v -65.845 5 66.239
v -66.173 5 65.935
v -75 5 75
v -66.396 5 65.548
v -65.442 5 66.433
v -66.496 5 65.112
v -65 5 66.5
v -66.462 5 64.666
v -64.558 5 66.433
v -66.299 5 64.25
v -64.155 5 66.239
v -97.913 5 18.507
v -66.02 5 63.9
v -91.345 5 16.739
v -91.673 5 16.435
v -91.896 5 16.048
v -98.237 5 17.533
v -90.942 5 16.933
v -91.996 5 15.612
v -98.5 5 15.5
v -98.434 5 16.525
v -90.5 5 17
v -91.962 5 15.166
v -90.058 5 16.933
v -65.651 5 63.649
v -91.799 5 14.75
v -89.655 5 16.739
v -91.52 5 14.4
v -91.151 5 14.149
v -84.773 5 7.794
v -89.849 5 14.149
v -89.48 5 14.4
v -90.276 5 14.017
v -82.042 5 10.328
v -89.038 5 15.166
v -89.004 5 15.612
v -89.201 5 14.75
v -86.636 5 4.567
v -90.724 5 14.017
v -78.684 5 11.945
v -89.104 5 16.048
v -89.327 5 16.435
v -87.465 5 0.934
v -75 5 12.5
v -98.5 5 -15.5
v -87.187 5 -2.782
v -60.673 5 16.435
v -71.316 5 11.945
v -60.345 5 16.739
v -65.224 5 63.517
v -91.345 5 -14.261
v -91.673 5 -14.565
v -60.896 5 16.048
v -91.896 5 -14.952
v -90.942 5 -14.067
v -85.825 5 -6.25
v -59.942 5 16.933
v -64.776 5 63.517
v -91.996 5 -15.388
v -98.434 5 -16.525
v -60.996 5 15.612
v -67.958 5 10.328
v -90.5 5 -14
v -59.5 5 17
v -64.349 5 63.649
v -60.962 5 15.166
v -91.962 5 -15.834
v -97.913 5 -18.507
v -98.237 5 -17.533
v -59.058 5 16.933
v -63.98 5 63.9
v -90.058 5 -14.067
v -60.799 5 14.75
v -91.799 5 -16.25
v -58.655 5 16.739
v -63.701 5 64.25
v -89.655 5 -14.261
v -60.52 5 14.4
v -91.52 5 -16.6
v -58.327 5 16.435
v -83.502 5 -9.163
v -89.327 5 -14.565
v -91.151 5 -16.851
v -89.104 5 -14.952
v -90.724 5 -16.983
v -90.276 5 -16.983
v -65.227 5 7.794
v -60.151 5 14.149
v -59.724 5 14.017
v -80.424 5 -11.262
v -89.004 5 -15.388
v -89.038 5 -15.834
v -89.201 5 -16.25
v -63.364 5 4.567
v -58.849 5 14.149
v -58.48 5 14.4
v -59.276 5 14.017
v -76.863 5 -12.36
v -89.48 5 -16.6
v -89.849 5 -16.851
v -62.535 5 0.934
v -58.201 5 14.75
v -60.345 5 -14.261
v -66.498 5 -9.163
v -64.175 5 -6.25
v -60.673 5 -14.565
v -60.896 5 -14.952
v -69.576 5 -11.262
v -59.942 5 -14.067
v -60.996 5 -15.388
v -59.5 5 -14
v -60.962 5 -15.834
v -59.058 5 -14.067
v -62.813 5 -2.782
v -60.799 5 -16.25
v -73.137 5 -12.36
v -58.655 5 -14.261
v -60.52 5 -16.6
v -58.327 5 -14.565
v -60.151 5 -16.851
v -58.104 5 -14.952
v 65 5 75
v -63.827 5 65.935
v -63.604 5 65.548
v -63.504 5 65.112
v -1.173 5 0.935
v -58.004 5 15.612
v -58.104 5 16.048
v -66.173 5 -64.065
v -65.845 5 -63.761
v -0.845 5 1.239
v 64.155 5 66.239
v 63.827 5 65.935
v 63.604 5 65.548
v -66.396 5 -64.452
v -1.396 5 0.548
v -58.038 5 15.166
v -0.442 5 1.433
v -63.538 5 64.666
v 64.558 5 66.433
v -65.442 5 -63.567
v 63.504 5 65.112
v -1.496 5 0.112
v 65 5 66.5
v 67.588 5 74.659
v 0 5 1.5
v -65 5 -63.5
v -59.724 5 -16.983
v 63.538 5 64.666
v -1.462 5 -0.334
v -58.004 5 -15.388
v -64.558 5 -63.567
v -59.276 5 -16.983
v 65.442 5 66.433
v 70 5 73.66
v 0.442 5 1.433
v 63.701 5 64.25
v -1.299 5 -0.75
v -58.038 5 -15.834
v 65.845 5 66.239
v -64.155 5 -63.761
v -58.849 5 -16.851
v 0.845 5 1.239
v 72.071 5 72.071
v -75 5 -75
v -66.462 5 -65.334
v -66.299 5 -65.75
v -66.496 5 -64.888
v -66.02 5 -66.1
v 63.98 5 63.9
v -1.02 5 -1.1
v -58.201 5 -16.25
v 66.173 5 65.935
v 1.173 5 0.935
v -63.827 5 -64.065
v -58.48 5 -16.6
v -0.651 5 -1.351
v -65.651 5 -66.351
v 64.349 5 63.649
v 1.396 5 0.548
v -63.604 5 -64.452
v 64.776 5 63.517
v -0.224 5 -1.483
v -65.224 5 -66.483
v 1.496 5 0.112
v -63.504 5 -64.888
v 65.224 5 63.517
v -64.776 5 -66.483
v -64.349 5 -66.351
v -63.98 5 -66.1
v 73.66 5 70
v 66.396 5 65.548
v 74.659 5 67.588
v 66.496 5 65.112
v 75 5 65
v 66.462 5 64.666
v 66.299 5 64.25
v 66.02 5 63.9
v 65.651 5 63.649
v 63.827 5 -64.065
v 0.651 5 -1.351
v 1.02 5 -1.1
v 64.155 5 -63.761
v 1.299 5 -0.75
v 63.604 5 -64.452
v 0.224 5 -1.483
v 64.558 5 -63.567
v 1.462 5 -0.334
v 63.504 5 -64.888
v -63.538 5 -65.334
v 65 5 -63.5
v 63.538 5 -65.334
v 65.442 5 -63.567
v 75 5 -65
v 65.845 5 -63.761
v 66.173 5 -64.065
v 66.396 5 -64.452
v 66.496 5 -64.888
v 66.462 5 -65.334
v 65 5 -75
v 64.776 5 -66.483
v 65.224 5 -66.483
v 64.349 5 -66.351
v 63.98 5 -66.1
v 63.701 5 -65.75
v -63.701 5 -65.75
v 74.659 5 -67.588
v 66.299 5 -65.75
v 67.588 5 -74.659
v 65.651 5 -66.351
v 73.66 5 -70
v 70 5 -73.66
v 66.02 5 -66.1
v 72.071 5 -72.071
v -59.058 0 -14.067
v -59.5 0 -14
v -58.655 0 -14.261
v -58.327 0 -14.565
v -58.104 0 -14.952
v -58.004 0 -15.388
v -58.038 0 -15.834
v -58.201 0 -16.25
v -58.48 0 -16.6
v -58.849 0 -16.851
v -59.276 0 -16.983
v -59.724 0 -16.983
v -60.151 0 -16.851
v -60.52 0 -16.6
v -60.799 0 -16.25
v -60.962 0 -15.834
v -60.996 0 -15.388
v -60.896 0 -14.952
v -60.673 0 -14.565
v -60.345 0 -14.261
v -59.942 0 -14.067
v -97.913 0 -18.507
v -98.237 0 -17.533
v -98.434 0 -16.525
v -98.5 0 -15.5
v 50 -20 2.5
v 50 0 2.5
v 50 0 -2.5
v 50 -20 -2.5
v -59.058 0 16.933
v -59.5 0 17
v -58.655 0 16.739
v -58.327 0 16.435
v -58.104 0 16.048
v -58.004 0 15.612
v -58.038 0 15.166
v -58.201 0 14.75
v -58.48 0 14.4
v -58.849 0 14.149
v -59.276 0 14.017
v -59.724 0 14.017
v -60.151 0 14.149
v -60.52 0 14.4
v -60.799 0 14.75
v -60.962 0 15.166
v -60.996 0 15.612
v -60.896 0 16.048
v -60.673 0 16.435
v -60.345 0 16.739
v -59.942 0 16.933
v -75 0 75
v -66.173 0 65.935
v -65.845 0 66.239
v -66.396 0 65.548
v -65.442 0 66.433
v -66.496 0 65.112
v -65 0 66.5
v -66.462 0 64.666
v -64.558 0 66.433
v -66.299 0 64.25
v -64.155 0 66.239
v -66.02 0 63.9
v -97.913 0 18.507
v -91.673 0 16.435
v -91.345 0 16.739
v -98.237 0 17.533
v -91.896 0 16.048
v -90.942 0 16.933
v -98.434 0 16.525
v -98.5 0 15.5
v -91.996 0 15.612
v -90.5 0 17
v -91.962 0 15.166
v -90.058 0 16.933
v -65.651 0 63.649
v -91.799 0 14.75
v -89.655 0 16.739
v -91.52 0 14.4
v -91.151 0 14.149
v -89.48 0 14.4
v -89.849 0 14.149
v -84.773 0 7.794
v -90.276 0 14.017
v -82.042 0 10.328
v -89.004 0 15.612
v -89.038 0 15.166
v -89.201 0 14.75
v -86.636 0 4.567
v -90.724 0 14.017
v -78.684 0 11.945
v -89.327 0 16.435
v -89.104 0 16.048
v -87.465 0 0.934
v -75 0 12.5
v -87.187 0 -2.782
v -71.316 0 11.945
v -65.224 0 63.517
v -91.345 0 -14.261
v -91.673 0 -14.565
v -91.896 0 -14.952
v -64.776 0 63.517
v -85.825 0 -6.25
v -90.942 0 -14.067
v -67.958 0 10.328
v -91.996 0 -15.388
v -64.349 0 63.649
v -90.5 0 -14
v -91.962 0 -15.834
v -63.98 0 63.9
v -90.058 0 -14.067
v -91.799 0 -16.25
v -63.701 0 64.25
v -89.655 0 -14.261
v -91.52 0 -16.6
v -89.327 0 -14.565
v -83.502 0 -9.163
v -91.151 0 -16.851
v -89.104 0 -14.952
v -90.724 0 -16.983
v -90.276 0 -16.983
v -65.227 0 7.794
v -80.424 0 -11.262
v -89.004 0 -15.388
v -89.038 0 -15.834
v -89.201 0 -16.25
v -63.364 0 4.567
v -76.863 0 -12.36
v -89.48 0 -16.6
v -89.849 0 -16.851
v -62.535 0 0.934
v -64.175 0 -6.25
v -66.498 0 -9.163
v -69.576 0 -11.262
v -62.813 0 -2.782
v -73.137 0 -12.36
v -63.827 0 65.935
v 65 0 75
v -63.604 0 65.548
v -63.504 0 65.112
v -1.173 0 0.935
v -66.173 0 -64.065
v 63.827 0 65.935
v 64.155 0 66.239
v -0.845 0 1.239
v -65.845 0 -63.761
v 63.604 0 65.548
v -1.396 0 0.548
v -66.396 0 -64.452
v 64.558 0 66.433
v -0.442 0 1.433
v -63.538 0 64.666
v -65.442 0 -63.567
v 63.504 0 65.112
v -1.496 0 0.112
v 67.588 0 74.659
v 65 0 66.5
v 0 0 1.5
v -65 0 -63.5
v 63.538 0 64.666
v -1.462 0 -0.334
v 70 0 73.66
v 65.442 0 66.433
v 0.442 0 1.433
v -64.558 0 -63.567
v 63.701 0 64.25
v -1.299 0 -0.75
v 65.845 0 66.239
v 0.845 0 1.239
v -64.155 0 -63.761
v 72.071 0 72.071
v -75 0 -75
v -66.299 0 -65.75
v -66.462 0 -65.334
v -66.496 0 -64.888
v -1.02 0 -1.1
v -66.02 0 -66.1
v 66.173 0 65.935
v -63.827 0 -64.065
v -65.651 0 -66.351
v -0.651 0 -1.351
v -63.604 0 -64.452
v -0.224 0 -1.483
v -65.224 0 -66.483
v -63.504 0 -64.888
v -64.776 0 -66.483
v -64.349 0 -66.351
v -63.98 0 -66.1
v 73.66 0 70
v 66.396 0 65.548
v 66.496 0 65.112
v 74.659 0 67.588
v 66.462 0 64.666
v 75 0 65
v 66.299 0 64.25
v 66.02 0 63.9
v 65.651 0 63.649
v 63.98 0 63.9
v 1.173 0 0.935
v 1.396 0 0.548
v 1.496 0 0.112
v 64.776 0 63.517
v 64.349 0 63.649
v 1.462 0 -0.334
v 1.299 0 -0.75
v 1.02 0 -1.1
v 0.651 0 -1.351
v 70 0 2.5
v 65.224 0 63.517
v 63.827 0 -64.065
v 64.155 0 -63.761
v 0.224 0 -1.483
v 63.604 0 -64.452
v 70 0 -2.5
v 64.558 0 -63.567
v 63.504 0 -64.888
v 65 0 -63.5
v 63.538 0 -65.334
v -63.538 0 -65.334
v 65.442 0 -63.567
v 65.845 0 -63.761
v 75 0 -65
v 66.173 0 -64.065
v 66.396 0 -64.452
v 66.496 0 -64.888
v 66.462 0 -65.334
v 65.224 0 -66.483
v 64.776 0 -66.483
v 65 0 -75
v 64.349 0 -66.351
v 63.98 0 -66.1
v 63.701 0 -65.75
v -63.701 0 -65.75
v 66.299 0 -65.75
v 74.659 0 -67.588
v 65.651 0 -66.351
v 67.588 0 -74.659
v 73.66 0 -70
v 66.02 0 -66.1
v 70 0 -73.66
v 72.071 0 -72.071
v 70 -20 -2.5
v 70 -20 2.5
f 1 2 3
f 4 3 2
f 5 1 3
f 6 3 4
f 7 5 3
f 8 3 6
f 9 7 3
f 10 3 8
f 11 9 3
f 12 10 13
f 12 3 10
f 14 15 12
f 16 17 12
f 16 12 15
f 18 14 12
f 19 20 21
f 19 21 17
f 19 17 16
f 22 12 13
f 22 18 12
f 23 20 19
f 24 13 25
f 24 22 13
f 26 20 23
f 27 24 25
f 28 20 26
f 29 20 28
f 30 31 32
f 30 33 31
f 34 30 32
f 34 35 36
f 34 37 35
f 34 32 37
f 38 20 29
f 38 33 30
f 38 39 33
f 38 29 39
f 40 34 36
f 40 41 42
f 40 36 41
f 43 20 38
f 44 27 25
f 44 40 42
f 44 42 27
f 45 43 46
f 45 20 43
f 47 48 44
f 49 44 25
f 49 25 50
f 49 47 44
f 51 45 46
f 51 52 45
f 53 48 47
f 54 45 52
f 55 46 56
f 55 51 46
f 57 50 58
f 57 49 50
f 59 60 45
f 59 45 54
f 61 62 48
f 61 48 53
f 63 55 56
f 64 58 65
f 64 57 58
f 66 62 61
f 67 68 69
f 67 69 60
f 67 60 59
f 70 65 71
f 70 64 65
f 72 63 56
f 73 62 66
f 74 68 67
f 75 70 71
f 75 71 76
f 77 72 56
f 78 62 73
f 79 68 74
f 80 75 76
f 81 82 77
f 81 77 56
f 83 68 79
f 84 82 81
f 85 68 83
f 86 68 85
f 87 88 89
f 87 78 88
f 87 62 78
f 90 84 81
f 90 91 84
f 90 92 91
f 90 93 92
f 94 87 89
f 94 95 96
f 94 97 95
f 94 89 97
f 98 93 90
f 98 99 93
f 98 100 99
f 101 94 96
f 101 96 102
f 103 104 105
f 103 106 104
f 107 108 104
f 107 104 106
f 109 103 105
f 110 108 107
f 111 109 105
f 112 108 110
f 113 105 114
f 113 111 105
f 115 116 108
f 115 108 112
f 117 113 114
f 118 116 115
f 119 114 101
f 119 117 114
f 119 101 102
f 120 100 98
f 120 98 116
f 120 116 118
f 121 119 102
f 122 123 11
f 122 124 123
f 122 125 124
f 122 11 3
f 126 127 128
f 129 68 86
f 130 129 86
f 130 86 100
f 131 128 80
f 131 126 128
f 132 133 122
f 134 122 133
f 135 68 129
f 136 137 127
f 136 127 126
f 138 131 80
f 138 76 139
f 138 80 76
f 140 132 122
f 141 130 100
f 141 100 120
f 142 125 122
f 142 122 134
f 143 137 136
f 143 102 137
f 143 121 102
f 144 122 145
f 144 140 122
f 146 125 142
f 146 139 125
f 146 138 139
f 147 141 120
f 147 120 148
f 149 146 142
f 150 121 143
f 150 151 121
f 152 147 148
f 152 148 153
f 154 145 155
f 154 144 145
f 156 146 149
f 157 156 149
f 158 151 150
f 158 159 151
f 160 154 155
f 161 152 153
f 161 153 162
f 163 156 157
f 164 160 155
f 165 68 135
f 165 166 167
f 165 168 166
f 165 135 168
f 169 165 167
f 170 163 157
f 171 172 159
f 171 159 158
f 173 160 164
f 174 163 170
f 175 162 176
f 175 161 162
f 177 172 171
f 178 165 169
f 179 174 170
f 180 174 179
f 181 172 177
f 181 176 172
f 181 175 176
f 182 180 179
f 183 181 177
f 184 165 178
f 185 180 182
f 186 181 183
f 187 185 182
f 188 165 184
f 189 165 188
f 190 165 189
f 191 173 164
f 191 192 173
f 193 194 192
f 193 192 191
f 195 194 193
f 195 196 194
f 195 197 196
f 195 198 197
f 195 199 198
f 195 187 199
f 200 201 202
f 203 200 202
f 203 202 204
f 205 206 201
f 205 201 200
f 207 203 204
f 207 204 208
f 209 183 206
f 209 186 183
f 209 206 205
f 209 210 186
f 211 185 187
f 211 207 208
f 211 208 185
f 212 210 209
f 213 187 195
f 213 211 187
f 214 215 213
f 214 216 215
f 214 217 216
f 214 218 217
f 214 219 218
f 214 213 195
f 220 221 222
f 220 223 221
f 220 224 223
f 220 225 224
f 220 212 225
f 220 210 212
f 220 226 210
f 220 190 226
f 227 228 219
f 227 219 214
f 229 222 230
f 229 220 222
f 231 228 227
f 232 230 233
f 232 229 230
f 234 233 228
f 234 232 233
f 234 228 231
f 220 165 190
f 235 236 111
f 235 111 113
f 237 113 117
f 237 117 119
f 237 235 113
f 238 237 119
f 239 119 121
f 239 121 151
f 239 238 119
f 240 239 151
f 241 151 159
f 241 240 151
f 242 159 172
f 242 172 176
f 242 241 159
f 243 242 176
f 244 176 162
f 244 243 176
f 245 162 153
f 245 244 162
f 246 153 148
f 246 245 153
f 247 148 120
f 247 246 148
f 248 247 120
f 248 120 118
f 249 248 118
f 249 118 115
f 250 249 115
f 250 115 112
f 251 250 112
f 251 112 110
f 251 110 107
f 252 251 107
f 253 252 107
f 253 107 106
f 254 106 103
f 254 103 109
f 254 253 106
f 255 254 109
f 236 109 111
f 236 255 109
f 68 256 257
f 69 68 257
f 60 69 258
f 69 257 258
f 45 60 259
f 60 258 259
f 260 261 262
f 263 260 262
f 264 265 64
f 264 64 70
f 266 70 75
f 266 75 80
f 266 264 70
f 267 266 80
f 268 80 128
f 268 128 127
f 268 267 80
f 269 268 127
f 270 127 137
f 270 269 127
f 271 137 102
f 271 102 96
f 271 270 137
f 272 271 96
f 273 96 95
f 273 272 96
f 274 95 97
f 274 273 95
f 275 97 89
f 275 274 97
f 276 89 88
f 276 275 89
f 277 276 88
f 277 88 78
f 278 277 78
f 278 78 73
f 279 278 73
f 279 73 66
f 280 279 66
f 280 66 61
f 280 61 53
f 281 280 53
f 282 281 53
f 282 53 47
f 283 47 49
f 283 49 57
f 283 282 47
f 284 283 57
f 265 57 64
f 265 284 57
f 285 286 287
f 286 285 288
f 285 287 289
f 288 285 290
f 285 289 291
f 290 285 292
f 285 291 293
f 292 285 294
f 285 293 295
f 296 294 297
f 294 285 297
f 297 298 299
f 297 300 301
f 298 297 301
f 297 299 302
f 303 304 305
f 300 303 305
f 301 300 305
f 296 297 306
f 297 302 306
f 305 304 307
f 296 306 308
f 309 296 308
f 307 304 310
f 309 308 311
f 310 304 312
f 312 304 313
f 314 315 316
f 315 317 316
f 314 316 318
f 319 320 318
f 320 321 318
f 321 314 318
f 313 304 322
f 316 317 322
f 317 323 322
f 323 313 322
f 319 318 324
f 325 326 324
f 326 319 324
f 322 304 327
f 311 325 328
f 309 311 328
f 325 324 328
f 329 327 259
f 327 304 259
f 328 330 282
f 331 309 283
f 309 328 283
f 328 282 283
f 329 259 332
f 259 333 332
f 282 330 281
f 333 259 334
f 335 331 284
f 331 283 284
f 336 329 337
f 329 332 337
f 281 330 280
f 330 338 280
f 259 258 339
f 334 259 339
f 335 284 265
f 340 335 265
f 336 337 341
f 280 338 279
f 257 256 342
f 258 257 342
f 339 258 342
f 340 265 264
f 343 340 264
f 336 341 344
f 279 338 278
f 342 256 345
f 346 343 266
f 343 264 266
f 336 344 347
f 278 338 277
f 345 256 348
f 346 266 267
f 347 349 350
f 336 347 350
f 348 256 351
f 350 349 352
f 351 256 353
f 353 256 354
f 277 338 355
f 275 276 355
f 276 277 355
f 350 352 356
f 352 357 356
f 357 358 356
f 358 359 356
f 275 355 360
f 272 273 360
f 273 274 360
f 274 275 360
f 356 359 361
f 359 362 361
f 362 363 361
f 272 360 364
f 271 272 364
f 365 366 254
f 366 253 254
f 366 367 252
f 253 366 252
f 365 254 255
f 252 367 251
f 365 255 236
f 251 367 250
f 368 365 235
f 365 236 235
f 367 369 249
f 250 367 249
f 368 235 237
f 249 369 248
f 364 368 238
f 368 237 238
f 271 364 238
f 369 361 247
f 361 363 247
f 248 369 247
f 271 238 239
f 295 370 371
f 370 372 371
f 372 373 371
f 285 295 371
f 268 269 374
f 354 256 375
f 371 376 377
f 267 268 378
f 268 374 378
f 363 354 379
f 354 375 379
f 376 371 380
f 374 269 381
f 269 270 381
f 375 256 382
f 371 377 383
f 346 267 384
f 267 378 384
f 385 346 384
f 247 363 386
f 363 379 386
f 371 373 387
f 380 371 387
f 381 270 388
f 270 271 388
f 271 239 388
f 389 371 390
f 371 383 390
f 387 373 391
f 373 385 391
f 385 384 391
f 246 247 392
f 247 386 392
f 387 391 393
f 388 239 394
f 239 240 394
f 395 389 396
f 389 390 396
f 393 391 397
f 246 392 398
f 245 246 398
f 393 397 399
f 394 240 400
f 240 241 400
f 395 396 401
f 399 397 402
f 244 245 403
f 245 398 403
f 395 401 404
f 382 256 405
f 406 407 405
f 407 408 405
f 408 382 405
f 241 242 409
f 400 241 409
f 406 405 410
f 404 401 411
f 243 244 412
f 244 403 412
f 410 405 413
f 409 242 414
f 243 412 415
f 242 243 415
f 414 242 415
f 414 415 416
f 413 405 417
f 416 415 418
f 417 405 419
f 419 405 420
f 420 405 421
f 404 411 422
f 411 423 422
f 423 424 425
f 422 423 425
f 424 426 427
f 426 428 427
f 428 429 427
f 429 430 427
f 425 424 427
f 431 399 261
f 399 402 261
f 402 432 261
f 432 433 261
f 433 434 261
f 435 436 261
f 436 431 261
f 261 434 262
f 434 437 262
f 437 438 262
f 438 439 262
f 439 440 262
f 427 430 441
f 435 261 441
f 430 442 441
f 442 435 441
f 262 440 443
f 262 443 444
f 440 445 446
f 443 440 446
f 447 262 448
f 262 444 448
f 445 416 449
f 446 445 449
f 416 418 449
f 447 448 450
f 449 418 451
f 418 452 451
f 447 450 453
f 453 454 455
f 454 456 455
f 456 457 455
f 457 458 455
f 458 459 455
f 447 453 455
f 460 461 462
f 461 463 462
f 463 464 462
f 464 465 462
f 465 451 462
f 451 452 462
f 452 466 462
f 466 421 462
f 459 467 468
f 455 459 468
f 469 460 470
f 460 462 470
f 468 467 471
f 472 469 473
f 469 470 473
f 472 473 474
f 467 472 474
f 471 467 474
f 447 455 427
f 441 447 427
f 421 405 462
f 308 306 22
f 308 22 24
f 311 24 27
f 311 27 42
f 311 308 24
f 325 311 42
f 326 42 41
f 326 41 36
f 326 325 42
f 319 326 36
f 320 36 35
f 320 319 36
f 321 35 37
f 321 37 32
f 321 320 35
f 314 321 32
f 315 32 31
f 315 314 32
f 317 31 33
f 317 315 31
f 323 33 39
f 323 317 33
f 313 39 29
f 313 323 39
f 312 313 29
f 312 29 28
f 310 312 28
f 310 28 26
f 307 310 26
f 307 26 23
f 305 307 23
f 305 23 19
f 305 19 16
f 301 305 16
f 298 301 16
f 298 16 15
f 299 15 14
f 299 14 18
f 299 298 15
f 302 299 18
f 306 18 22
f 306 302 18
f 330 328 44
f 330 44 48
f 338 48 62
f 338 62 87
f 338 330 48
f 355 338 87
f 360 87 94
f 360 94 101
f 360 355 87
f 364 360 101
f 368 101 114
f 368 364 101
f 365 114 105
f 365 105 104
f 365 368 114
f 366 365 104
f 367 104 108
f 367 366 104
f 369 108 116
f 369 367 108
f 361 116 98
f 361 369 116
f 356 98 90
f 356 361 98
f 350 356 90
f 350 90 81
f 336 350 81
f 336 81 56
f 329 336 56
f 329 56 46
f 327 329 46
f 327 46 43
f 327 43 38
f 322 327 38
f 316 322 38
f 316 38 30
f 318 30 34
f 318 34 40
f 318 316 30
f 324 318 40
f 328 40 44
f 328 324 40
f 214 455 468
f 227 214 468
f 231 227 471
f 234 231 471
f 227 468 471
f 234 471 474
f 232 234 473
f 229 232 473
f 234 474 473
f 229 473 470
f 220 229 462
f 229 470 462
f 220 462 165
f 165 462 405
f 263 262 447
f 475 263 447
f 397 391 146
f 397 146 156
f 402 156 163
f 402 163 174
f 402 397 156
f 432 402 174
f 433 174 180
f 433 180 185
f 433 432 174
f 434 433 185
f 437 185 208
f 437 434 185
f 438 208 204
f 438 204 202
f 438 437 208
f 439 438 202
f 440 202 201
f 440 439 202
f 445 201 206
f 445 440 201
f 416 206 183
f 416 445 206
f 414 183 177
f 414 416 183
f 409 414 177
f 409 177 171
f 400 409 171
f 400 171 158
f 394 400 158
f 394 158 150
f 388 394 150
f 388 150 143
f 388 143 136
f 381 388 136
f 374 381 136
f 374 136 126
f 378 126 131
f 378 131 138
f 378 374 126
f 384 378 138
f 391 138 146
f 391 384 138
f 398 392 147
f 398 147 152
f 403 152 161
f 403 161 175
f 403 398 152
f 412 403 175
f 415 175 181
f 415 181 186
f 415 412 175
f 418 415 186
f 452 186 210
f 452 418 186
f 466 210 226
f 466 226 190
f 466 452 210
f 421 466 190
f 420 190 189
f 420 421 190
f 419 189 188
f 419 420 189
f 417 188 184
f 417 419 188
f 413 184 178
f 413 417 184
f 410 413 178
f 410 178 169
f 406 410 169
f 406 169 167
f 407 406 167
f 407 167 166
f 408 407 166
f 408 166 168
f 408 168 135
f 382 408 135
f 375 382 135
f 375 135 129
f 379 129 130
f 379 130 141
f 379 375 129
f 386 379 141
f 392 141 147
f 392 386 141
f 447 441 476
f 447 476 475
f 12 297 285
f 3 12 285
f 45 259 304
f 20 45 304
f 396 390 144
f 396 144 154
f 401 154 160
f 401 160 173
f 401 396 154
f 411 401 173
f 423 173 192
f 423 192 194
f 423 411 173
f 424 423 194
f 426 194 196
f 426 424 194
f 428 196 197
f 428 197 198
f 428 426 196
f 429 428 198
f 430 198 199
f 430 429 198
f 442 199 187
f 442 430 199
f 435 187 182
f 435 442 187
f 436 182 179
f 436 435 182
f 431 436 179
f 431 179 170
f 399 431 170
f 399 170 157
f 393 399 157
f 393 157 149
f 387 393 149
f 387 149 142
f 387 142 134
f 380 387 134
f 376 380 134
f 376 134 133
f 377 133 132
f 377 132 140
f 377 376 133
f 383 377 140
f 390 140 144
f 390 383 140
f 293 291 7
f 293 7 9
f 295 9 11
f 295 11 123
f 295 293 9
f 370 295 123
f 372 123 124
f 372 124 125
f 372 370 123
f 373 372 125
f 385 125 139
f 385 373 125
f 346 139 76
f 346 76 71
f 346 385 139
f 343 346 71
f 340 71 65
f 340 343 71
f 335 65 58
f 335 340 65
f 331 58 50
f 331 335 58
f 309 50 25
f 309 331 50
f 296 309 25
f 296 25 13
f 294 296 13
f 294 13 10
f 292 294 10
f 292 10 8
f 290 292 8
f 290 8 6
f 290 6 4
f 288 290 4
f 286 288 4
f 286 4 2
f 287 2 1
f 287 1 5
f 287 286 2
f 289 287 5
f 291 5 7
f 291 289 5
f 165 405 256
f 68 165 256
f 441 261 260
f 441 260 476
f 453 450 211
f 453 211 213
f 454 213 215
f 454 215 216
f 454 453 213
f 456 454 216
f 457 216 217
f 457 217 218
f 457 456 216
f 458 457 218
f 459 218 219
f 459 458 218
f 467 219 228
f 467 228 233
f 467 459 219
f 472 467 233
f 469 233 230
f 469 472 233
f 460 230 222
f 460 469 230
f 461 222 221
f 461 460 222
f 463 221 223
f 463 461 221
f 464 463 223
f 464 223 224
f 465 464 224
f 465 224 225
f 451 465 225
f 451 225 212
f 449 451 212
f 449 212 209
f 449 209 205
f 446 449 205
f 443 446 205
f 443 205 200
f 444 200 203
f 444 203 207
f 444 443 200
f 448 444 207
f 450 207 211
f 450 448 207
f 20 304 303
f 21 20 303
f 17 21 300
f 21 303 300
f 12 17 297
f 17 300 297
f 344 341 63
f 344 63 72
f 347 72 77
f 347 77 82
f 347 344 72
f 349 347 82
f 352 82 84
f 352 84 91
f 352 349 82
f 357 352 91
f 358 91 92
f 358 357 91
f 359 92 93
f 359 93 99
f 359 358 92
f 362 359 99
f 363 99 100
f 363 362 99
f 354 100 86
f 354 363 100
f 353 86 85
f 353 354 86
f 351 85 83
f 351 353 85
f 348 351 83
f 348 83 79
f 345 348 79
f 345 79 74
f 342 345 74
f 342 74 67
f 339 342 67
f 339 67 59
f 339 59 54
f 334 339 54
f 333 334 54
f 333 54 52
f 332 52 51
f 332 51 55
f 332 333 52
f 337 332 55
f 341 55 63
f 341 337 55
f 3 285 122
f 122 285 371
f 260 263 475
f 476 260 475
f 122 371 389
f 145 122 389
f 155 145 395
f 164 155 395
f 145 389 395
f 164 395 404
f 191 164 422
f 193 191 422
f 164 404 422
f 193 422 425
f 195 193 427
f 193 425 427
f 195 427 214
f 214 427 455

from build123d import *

# Parameters (mm, degrees)
SKETCH1_R           = 1.5
SKETCH1_R_2         = 12.5
BOSS_EXTRUDE1_DEPTH = 5
SKETCH2_W           = 20
SKETCH2_H           = 5
BOSS_EXTRUDE2_DEPTH = 25


with BuildPart() as part:
    # Sketch1 → Boss-Extrude1 (new body)
    with BuildSketch(Plane(origin=(0, 0, 0), x_dir=(1, 0, 0), z_dir=(0, 1, 0))):
        with BuildLine():
            Line((-75, -75), (65, -75))
            ThreePointArc((65, -75), (72.071067812, -72.071067812), (75, -65))
            Line((75, -65), (75, 65))
            ThreePointArc((75, 65), (72.071067812, 72.071067812), (65, 75))
            Line((65, 75), (-75, 75))
            Line((-75, 75), (-97.913420794, 18.506857518))
            ThreePointArc((-97.913420794, 18.506857518), (-98.351985938, 17.031769181), (-98.5, 15.5))
            Line((-98.5, 15.5), (-98.5, -15.5))
            ThreePointArc((-98.5, -15.5), (-98.351985938, -17.031769181), (-97.913420794, -18.506857518))
            Line((-97.913420794, -18.506857518), (-75, -75))
        make_face()
        with Locations(Location((-90.5, 15.5, 0), (0, 0, 270))):
            Circle(SKETCH1_R, mode=Mode.SUBTRACT)
        with Locations(Location((-90.5, -15.5, 0), (0, 0, 270))):
            Circle(SKETCH1_R, mode=Mode.SUBTRACT)
        with Locations(Location((-59.5, -15.5, 0), (0, 0, 270))):
            Circle(SKETCH1_R, mode=Mode.SUBTRACT)
        with Locations(Location((-59.5, 15.5, 0), (0, 0, 270))):
            Circle(SKETCH1_R, mode=Mode.SUBTRACT)
        with Locations(Location((-75, 0, 0), (0, 0, 270))):
            Circle(SKETCH1_R_2, mode=Mode.SUBTRACT)
        with Locations(Location((-65, 65, 0), (0, 0, 270))):
            Circle(SKETCH1_R, mode=Mode.SUBTRACT)
        with Locations(Location((65, 65, 0), (0, 0, 270))):
            Circle(SKETCH1_R, mode=Mode.SUBTRACT)
        with Locations(Location((65, -65, 0), (0, 0, 270))):
            Circle(SKETCH1_R, mode=Mode.SUBTRACT)
        with Locations(Location((-65, -65, 0), (0, 0, 270))):
            Circle(SKETCH1_R, mode=Mode.SUBTRACT)
        with Locations(Location((0, 0, 0), (0, 0, 270))):
            Circle(SKETCH1_R, mode=Mode.SUBTRACT)
    extrude(amount=BOSS_EXTRUDE1_DEPTH)

    # Sketch2 → Boss-Extrude2 (add)
    with BuildSketch(Plane(origin=(0, 5, 0), x_dir=(1, 0, 0), z_dir=(0, 1, 0))):
        with Locations((60, 0)):
            Rectangle(SKETCH2_W, SKETCH2_H)
    extrude(amount=-BOSS_EXTRUDE2_DEPTH)


solid = part.part
